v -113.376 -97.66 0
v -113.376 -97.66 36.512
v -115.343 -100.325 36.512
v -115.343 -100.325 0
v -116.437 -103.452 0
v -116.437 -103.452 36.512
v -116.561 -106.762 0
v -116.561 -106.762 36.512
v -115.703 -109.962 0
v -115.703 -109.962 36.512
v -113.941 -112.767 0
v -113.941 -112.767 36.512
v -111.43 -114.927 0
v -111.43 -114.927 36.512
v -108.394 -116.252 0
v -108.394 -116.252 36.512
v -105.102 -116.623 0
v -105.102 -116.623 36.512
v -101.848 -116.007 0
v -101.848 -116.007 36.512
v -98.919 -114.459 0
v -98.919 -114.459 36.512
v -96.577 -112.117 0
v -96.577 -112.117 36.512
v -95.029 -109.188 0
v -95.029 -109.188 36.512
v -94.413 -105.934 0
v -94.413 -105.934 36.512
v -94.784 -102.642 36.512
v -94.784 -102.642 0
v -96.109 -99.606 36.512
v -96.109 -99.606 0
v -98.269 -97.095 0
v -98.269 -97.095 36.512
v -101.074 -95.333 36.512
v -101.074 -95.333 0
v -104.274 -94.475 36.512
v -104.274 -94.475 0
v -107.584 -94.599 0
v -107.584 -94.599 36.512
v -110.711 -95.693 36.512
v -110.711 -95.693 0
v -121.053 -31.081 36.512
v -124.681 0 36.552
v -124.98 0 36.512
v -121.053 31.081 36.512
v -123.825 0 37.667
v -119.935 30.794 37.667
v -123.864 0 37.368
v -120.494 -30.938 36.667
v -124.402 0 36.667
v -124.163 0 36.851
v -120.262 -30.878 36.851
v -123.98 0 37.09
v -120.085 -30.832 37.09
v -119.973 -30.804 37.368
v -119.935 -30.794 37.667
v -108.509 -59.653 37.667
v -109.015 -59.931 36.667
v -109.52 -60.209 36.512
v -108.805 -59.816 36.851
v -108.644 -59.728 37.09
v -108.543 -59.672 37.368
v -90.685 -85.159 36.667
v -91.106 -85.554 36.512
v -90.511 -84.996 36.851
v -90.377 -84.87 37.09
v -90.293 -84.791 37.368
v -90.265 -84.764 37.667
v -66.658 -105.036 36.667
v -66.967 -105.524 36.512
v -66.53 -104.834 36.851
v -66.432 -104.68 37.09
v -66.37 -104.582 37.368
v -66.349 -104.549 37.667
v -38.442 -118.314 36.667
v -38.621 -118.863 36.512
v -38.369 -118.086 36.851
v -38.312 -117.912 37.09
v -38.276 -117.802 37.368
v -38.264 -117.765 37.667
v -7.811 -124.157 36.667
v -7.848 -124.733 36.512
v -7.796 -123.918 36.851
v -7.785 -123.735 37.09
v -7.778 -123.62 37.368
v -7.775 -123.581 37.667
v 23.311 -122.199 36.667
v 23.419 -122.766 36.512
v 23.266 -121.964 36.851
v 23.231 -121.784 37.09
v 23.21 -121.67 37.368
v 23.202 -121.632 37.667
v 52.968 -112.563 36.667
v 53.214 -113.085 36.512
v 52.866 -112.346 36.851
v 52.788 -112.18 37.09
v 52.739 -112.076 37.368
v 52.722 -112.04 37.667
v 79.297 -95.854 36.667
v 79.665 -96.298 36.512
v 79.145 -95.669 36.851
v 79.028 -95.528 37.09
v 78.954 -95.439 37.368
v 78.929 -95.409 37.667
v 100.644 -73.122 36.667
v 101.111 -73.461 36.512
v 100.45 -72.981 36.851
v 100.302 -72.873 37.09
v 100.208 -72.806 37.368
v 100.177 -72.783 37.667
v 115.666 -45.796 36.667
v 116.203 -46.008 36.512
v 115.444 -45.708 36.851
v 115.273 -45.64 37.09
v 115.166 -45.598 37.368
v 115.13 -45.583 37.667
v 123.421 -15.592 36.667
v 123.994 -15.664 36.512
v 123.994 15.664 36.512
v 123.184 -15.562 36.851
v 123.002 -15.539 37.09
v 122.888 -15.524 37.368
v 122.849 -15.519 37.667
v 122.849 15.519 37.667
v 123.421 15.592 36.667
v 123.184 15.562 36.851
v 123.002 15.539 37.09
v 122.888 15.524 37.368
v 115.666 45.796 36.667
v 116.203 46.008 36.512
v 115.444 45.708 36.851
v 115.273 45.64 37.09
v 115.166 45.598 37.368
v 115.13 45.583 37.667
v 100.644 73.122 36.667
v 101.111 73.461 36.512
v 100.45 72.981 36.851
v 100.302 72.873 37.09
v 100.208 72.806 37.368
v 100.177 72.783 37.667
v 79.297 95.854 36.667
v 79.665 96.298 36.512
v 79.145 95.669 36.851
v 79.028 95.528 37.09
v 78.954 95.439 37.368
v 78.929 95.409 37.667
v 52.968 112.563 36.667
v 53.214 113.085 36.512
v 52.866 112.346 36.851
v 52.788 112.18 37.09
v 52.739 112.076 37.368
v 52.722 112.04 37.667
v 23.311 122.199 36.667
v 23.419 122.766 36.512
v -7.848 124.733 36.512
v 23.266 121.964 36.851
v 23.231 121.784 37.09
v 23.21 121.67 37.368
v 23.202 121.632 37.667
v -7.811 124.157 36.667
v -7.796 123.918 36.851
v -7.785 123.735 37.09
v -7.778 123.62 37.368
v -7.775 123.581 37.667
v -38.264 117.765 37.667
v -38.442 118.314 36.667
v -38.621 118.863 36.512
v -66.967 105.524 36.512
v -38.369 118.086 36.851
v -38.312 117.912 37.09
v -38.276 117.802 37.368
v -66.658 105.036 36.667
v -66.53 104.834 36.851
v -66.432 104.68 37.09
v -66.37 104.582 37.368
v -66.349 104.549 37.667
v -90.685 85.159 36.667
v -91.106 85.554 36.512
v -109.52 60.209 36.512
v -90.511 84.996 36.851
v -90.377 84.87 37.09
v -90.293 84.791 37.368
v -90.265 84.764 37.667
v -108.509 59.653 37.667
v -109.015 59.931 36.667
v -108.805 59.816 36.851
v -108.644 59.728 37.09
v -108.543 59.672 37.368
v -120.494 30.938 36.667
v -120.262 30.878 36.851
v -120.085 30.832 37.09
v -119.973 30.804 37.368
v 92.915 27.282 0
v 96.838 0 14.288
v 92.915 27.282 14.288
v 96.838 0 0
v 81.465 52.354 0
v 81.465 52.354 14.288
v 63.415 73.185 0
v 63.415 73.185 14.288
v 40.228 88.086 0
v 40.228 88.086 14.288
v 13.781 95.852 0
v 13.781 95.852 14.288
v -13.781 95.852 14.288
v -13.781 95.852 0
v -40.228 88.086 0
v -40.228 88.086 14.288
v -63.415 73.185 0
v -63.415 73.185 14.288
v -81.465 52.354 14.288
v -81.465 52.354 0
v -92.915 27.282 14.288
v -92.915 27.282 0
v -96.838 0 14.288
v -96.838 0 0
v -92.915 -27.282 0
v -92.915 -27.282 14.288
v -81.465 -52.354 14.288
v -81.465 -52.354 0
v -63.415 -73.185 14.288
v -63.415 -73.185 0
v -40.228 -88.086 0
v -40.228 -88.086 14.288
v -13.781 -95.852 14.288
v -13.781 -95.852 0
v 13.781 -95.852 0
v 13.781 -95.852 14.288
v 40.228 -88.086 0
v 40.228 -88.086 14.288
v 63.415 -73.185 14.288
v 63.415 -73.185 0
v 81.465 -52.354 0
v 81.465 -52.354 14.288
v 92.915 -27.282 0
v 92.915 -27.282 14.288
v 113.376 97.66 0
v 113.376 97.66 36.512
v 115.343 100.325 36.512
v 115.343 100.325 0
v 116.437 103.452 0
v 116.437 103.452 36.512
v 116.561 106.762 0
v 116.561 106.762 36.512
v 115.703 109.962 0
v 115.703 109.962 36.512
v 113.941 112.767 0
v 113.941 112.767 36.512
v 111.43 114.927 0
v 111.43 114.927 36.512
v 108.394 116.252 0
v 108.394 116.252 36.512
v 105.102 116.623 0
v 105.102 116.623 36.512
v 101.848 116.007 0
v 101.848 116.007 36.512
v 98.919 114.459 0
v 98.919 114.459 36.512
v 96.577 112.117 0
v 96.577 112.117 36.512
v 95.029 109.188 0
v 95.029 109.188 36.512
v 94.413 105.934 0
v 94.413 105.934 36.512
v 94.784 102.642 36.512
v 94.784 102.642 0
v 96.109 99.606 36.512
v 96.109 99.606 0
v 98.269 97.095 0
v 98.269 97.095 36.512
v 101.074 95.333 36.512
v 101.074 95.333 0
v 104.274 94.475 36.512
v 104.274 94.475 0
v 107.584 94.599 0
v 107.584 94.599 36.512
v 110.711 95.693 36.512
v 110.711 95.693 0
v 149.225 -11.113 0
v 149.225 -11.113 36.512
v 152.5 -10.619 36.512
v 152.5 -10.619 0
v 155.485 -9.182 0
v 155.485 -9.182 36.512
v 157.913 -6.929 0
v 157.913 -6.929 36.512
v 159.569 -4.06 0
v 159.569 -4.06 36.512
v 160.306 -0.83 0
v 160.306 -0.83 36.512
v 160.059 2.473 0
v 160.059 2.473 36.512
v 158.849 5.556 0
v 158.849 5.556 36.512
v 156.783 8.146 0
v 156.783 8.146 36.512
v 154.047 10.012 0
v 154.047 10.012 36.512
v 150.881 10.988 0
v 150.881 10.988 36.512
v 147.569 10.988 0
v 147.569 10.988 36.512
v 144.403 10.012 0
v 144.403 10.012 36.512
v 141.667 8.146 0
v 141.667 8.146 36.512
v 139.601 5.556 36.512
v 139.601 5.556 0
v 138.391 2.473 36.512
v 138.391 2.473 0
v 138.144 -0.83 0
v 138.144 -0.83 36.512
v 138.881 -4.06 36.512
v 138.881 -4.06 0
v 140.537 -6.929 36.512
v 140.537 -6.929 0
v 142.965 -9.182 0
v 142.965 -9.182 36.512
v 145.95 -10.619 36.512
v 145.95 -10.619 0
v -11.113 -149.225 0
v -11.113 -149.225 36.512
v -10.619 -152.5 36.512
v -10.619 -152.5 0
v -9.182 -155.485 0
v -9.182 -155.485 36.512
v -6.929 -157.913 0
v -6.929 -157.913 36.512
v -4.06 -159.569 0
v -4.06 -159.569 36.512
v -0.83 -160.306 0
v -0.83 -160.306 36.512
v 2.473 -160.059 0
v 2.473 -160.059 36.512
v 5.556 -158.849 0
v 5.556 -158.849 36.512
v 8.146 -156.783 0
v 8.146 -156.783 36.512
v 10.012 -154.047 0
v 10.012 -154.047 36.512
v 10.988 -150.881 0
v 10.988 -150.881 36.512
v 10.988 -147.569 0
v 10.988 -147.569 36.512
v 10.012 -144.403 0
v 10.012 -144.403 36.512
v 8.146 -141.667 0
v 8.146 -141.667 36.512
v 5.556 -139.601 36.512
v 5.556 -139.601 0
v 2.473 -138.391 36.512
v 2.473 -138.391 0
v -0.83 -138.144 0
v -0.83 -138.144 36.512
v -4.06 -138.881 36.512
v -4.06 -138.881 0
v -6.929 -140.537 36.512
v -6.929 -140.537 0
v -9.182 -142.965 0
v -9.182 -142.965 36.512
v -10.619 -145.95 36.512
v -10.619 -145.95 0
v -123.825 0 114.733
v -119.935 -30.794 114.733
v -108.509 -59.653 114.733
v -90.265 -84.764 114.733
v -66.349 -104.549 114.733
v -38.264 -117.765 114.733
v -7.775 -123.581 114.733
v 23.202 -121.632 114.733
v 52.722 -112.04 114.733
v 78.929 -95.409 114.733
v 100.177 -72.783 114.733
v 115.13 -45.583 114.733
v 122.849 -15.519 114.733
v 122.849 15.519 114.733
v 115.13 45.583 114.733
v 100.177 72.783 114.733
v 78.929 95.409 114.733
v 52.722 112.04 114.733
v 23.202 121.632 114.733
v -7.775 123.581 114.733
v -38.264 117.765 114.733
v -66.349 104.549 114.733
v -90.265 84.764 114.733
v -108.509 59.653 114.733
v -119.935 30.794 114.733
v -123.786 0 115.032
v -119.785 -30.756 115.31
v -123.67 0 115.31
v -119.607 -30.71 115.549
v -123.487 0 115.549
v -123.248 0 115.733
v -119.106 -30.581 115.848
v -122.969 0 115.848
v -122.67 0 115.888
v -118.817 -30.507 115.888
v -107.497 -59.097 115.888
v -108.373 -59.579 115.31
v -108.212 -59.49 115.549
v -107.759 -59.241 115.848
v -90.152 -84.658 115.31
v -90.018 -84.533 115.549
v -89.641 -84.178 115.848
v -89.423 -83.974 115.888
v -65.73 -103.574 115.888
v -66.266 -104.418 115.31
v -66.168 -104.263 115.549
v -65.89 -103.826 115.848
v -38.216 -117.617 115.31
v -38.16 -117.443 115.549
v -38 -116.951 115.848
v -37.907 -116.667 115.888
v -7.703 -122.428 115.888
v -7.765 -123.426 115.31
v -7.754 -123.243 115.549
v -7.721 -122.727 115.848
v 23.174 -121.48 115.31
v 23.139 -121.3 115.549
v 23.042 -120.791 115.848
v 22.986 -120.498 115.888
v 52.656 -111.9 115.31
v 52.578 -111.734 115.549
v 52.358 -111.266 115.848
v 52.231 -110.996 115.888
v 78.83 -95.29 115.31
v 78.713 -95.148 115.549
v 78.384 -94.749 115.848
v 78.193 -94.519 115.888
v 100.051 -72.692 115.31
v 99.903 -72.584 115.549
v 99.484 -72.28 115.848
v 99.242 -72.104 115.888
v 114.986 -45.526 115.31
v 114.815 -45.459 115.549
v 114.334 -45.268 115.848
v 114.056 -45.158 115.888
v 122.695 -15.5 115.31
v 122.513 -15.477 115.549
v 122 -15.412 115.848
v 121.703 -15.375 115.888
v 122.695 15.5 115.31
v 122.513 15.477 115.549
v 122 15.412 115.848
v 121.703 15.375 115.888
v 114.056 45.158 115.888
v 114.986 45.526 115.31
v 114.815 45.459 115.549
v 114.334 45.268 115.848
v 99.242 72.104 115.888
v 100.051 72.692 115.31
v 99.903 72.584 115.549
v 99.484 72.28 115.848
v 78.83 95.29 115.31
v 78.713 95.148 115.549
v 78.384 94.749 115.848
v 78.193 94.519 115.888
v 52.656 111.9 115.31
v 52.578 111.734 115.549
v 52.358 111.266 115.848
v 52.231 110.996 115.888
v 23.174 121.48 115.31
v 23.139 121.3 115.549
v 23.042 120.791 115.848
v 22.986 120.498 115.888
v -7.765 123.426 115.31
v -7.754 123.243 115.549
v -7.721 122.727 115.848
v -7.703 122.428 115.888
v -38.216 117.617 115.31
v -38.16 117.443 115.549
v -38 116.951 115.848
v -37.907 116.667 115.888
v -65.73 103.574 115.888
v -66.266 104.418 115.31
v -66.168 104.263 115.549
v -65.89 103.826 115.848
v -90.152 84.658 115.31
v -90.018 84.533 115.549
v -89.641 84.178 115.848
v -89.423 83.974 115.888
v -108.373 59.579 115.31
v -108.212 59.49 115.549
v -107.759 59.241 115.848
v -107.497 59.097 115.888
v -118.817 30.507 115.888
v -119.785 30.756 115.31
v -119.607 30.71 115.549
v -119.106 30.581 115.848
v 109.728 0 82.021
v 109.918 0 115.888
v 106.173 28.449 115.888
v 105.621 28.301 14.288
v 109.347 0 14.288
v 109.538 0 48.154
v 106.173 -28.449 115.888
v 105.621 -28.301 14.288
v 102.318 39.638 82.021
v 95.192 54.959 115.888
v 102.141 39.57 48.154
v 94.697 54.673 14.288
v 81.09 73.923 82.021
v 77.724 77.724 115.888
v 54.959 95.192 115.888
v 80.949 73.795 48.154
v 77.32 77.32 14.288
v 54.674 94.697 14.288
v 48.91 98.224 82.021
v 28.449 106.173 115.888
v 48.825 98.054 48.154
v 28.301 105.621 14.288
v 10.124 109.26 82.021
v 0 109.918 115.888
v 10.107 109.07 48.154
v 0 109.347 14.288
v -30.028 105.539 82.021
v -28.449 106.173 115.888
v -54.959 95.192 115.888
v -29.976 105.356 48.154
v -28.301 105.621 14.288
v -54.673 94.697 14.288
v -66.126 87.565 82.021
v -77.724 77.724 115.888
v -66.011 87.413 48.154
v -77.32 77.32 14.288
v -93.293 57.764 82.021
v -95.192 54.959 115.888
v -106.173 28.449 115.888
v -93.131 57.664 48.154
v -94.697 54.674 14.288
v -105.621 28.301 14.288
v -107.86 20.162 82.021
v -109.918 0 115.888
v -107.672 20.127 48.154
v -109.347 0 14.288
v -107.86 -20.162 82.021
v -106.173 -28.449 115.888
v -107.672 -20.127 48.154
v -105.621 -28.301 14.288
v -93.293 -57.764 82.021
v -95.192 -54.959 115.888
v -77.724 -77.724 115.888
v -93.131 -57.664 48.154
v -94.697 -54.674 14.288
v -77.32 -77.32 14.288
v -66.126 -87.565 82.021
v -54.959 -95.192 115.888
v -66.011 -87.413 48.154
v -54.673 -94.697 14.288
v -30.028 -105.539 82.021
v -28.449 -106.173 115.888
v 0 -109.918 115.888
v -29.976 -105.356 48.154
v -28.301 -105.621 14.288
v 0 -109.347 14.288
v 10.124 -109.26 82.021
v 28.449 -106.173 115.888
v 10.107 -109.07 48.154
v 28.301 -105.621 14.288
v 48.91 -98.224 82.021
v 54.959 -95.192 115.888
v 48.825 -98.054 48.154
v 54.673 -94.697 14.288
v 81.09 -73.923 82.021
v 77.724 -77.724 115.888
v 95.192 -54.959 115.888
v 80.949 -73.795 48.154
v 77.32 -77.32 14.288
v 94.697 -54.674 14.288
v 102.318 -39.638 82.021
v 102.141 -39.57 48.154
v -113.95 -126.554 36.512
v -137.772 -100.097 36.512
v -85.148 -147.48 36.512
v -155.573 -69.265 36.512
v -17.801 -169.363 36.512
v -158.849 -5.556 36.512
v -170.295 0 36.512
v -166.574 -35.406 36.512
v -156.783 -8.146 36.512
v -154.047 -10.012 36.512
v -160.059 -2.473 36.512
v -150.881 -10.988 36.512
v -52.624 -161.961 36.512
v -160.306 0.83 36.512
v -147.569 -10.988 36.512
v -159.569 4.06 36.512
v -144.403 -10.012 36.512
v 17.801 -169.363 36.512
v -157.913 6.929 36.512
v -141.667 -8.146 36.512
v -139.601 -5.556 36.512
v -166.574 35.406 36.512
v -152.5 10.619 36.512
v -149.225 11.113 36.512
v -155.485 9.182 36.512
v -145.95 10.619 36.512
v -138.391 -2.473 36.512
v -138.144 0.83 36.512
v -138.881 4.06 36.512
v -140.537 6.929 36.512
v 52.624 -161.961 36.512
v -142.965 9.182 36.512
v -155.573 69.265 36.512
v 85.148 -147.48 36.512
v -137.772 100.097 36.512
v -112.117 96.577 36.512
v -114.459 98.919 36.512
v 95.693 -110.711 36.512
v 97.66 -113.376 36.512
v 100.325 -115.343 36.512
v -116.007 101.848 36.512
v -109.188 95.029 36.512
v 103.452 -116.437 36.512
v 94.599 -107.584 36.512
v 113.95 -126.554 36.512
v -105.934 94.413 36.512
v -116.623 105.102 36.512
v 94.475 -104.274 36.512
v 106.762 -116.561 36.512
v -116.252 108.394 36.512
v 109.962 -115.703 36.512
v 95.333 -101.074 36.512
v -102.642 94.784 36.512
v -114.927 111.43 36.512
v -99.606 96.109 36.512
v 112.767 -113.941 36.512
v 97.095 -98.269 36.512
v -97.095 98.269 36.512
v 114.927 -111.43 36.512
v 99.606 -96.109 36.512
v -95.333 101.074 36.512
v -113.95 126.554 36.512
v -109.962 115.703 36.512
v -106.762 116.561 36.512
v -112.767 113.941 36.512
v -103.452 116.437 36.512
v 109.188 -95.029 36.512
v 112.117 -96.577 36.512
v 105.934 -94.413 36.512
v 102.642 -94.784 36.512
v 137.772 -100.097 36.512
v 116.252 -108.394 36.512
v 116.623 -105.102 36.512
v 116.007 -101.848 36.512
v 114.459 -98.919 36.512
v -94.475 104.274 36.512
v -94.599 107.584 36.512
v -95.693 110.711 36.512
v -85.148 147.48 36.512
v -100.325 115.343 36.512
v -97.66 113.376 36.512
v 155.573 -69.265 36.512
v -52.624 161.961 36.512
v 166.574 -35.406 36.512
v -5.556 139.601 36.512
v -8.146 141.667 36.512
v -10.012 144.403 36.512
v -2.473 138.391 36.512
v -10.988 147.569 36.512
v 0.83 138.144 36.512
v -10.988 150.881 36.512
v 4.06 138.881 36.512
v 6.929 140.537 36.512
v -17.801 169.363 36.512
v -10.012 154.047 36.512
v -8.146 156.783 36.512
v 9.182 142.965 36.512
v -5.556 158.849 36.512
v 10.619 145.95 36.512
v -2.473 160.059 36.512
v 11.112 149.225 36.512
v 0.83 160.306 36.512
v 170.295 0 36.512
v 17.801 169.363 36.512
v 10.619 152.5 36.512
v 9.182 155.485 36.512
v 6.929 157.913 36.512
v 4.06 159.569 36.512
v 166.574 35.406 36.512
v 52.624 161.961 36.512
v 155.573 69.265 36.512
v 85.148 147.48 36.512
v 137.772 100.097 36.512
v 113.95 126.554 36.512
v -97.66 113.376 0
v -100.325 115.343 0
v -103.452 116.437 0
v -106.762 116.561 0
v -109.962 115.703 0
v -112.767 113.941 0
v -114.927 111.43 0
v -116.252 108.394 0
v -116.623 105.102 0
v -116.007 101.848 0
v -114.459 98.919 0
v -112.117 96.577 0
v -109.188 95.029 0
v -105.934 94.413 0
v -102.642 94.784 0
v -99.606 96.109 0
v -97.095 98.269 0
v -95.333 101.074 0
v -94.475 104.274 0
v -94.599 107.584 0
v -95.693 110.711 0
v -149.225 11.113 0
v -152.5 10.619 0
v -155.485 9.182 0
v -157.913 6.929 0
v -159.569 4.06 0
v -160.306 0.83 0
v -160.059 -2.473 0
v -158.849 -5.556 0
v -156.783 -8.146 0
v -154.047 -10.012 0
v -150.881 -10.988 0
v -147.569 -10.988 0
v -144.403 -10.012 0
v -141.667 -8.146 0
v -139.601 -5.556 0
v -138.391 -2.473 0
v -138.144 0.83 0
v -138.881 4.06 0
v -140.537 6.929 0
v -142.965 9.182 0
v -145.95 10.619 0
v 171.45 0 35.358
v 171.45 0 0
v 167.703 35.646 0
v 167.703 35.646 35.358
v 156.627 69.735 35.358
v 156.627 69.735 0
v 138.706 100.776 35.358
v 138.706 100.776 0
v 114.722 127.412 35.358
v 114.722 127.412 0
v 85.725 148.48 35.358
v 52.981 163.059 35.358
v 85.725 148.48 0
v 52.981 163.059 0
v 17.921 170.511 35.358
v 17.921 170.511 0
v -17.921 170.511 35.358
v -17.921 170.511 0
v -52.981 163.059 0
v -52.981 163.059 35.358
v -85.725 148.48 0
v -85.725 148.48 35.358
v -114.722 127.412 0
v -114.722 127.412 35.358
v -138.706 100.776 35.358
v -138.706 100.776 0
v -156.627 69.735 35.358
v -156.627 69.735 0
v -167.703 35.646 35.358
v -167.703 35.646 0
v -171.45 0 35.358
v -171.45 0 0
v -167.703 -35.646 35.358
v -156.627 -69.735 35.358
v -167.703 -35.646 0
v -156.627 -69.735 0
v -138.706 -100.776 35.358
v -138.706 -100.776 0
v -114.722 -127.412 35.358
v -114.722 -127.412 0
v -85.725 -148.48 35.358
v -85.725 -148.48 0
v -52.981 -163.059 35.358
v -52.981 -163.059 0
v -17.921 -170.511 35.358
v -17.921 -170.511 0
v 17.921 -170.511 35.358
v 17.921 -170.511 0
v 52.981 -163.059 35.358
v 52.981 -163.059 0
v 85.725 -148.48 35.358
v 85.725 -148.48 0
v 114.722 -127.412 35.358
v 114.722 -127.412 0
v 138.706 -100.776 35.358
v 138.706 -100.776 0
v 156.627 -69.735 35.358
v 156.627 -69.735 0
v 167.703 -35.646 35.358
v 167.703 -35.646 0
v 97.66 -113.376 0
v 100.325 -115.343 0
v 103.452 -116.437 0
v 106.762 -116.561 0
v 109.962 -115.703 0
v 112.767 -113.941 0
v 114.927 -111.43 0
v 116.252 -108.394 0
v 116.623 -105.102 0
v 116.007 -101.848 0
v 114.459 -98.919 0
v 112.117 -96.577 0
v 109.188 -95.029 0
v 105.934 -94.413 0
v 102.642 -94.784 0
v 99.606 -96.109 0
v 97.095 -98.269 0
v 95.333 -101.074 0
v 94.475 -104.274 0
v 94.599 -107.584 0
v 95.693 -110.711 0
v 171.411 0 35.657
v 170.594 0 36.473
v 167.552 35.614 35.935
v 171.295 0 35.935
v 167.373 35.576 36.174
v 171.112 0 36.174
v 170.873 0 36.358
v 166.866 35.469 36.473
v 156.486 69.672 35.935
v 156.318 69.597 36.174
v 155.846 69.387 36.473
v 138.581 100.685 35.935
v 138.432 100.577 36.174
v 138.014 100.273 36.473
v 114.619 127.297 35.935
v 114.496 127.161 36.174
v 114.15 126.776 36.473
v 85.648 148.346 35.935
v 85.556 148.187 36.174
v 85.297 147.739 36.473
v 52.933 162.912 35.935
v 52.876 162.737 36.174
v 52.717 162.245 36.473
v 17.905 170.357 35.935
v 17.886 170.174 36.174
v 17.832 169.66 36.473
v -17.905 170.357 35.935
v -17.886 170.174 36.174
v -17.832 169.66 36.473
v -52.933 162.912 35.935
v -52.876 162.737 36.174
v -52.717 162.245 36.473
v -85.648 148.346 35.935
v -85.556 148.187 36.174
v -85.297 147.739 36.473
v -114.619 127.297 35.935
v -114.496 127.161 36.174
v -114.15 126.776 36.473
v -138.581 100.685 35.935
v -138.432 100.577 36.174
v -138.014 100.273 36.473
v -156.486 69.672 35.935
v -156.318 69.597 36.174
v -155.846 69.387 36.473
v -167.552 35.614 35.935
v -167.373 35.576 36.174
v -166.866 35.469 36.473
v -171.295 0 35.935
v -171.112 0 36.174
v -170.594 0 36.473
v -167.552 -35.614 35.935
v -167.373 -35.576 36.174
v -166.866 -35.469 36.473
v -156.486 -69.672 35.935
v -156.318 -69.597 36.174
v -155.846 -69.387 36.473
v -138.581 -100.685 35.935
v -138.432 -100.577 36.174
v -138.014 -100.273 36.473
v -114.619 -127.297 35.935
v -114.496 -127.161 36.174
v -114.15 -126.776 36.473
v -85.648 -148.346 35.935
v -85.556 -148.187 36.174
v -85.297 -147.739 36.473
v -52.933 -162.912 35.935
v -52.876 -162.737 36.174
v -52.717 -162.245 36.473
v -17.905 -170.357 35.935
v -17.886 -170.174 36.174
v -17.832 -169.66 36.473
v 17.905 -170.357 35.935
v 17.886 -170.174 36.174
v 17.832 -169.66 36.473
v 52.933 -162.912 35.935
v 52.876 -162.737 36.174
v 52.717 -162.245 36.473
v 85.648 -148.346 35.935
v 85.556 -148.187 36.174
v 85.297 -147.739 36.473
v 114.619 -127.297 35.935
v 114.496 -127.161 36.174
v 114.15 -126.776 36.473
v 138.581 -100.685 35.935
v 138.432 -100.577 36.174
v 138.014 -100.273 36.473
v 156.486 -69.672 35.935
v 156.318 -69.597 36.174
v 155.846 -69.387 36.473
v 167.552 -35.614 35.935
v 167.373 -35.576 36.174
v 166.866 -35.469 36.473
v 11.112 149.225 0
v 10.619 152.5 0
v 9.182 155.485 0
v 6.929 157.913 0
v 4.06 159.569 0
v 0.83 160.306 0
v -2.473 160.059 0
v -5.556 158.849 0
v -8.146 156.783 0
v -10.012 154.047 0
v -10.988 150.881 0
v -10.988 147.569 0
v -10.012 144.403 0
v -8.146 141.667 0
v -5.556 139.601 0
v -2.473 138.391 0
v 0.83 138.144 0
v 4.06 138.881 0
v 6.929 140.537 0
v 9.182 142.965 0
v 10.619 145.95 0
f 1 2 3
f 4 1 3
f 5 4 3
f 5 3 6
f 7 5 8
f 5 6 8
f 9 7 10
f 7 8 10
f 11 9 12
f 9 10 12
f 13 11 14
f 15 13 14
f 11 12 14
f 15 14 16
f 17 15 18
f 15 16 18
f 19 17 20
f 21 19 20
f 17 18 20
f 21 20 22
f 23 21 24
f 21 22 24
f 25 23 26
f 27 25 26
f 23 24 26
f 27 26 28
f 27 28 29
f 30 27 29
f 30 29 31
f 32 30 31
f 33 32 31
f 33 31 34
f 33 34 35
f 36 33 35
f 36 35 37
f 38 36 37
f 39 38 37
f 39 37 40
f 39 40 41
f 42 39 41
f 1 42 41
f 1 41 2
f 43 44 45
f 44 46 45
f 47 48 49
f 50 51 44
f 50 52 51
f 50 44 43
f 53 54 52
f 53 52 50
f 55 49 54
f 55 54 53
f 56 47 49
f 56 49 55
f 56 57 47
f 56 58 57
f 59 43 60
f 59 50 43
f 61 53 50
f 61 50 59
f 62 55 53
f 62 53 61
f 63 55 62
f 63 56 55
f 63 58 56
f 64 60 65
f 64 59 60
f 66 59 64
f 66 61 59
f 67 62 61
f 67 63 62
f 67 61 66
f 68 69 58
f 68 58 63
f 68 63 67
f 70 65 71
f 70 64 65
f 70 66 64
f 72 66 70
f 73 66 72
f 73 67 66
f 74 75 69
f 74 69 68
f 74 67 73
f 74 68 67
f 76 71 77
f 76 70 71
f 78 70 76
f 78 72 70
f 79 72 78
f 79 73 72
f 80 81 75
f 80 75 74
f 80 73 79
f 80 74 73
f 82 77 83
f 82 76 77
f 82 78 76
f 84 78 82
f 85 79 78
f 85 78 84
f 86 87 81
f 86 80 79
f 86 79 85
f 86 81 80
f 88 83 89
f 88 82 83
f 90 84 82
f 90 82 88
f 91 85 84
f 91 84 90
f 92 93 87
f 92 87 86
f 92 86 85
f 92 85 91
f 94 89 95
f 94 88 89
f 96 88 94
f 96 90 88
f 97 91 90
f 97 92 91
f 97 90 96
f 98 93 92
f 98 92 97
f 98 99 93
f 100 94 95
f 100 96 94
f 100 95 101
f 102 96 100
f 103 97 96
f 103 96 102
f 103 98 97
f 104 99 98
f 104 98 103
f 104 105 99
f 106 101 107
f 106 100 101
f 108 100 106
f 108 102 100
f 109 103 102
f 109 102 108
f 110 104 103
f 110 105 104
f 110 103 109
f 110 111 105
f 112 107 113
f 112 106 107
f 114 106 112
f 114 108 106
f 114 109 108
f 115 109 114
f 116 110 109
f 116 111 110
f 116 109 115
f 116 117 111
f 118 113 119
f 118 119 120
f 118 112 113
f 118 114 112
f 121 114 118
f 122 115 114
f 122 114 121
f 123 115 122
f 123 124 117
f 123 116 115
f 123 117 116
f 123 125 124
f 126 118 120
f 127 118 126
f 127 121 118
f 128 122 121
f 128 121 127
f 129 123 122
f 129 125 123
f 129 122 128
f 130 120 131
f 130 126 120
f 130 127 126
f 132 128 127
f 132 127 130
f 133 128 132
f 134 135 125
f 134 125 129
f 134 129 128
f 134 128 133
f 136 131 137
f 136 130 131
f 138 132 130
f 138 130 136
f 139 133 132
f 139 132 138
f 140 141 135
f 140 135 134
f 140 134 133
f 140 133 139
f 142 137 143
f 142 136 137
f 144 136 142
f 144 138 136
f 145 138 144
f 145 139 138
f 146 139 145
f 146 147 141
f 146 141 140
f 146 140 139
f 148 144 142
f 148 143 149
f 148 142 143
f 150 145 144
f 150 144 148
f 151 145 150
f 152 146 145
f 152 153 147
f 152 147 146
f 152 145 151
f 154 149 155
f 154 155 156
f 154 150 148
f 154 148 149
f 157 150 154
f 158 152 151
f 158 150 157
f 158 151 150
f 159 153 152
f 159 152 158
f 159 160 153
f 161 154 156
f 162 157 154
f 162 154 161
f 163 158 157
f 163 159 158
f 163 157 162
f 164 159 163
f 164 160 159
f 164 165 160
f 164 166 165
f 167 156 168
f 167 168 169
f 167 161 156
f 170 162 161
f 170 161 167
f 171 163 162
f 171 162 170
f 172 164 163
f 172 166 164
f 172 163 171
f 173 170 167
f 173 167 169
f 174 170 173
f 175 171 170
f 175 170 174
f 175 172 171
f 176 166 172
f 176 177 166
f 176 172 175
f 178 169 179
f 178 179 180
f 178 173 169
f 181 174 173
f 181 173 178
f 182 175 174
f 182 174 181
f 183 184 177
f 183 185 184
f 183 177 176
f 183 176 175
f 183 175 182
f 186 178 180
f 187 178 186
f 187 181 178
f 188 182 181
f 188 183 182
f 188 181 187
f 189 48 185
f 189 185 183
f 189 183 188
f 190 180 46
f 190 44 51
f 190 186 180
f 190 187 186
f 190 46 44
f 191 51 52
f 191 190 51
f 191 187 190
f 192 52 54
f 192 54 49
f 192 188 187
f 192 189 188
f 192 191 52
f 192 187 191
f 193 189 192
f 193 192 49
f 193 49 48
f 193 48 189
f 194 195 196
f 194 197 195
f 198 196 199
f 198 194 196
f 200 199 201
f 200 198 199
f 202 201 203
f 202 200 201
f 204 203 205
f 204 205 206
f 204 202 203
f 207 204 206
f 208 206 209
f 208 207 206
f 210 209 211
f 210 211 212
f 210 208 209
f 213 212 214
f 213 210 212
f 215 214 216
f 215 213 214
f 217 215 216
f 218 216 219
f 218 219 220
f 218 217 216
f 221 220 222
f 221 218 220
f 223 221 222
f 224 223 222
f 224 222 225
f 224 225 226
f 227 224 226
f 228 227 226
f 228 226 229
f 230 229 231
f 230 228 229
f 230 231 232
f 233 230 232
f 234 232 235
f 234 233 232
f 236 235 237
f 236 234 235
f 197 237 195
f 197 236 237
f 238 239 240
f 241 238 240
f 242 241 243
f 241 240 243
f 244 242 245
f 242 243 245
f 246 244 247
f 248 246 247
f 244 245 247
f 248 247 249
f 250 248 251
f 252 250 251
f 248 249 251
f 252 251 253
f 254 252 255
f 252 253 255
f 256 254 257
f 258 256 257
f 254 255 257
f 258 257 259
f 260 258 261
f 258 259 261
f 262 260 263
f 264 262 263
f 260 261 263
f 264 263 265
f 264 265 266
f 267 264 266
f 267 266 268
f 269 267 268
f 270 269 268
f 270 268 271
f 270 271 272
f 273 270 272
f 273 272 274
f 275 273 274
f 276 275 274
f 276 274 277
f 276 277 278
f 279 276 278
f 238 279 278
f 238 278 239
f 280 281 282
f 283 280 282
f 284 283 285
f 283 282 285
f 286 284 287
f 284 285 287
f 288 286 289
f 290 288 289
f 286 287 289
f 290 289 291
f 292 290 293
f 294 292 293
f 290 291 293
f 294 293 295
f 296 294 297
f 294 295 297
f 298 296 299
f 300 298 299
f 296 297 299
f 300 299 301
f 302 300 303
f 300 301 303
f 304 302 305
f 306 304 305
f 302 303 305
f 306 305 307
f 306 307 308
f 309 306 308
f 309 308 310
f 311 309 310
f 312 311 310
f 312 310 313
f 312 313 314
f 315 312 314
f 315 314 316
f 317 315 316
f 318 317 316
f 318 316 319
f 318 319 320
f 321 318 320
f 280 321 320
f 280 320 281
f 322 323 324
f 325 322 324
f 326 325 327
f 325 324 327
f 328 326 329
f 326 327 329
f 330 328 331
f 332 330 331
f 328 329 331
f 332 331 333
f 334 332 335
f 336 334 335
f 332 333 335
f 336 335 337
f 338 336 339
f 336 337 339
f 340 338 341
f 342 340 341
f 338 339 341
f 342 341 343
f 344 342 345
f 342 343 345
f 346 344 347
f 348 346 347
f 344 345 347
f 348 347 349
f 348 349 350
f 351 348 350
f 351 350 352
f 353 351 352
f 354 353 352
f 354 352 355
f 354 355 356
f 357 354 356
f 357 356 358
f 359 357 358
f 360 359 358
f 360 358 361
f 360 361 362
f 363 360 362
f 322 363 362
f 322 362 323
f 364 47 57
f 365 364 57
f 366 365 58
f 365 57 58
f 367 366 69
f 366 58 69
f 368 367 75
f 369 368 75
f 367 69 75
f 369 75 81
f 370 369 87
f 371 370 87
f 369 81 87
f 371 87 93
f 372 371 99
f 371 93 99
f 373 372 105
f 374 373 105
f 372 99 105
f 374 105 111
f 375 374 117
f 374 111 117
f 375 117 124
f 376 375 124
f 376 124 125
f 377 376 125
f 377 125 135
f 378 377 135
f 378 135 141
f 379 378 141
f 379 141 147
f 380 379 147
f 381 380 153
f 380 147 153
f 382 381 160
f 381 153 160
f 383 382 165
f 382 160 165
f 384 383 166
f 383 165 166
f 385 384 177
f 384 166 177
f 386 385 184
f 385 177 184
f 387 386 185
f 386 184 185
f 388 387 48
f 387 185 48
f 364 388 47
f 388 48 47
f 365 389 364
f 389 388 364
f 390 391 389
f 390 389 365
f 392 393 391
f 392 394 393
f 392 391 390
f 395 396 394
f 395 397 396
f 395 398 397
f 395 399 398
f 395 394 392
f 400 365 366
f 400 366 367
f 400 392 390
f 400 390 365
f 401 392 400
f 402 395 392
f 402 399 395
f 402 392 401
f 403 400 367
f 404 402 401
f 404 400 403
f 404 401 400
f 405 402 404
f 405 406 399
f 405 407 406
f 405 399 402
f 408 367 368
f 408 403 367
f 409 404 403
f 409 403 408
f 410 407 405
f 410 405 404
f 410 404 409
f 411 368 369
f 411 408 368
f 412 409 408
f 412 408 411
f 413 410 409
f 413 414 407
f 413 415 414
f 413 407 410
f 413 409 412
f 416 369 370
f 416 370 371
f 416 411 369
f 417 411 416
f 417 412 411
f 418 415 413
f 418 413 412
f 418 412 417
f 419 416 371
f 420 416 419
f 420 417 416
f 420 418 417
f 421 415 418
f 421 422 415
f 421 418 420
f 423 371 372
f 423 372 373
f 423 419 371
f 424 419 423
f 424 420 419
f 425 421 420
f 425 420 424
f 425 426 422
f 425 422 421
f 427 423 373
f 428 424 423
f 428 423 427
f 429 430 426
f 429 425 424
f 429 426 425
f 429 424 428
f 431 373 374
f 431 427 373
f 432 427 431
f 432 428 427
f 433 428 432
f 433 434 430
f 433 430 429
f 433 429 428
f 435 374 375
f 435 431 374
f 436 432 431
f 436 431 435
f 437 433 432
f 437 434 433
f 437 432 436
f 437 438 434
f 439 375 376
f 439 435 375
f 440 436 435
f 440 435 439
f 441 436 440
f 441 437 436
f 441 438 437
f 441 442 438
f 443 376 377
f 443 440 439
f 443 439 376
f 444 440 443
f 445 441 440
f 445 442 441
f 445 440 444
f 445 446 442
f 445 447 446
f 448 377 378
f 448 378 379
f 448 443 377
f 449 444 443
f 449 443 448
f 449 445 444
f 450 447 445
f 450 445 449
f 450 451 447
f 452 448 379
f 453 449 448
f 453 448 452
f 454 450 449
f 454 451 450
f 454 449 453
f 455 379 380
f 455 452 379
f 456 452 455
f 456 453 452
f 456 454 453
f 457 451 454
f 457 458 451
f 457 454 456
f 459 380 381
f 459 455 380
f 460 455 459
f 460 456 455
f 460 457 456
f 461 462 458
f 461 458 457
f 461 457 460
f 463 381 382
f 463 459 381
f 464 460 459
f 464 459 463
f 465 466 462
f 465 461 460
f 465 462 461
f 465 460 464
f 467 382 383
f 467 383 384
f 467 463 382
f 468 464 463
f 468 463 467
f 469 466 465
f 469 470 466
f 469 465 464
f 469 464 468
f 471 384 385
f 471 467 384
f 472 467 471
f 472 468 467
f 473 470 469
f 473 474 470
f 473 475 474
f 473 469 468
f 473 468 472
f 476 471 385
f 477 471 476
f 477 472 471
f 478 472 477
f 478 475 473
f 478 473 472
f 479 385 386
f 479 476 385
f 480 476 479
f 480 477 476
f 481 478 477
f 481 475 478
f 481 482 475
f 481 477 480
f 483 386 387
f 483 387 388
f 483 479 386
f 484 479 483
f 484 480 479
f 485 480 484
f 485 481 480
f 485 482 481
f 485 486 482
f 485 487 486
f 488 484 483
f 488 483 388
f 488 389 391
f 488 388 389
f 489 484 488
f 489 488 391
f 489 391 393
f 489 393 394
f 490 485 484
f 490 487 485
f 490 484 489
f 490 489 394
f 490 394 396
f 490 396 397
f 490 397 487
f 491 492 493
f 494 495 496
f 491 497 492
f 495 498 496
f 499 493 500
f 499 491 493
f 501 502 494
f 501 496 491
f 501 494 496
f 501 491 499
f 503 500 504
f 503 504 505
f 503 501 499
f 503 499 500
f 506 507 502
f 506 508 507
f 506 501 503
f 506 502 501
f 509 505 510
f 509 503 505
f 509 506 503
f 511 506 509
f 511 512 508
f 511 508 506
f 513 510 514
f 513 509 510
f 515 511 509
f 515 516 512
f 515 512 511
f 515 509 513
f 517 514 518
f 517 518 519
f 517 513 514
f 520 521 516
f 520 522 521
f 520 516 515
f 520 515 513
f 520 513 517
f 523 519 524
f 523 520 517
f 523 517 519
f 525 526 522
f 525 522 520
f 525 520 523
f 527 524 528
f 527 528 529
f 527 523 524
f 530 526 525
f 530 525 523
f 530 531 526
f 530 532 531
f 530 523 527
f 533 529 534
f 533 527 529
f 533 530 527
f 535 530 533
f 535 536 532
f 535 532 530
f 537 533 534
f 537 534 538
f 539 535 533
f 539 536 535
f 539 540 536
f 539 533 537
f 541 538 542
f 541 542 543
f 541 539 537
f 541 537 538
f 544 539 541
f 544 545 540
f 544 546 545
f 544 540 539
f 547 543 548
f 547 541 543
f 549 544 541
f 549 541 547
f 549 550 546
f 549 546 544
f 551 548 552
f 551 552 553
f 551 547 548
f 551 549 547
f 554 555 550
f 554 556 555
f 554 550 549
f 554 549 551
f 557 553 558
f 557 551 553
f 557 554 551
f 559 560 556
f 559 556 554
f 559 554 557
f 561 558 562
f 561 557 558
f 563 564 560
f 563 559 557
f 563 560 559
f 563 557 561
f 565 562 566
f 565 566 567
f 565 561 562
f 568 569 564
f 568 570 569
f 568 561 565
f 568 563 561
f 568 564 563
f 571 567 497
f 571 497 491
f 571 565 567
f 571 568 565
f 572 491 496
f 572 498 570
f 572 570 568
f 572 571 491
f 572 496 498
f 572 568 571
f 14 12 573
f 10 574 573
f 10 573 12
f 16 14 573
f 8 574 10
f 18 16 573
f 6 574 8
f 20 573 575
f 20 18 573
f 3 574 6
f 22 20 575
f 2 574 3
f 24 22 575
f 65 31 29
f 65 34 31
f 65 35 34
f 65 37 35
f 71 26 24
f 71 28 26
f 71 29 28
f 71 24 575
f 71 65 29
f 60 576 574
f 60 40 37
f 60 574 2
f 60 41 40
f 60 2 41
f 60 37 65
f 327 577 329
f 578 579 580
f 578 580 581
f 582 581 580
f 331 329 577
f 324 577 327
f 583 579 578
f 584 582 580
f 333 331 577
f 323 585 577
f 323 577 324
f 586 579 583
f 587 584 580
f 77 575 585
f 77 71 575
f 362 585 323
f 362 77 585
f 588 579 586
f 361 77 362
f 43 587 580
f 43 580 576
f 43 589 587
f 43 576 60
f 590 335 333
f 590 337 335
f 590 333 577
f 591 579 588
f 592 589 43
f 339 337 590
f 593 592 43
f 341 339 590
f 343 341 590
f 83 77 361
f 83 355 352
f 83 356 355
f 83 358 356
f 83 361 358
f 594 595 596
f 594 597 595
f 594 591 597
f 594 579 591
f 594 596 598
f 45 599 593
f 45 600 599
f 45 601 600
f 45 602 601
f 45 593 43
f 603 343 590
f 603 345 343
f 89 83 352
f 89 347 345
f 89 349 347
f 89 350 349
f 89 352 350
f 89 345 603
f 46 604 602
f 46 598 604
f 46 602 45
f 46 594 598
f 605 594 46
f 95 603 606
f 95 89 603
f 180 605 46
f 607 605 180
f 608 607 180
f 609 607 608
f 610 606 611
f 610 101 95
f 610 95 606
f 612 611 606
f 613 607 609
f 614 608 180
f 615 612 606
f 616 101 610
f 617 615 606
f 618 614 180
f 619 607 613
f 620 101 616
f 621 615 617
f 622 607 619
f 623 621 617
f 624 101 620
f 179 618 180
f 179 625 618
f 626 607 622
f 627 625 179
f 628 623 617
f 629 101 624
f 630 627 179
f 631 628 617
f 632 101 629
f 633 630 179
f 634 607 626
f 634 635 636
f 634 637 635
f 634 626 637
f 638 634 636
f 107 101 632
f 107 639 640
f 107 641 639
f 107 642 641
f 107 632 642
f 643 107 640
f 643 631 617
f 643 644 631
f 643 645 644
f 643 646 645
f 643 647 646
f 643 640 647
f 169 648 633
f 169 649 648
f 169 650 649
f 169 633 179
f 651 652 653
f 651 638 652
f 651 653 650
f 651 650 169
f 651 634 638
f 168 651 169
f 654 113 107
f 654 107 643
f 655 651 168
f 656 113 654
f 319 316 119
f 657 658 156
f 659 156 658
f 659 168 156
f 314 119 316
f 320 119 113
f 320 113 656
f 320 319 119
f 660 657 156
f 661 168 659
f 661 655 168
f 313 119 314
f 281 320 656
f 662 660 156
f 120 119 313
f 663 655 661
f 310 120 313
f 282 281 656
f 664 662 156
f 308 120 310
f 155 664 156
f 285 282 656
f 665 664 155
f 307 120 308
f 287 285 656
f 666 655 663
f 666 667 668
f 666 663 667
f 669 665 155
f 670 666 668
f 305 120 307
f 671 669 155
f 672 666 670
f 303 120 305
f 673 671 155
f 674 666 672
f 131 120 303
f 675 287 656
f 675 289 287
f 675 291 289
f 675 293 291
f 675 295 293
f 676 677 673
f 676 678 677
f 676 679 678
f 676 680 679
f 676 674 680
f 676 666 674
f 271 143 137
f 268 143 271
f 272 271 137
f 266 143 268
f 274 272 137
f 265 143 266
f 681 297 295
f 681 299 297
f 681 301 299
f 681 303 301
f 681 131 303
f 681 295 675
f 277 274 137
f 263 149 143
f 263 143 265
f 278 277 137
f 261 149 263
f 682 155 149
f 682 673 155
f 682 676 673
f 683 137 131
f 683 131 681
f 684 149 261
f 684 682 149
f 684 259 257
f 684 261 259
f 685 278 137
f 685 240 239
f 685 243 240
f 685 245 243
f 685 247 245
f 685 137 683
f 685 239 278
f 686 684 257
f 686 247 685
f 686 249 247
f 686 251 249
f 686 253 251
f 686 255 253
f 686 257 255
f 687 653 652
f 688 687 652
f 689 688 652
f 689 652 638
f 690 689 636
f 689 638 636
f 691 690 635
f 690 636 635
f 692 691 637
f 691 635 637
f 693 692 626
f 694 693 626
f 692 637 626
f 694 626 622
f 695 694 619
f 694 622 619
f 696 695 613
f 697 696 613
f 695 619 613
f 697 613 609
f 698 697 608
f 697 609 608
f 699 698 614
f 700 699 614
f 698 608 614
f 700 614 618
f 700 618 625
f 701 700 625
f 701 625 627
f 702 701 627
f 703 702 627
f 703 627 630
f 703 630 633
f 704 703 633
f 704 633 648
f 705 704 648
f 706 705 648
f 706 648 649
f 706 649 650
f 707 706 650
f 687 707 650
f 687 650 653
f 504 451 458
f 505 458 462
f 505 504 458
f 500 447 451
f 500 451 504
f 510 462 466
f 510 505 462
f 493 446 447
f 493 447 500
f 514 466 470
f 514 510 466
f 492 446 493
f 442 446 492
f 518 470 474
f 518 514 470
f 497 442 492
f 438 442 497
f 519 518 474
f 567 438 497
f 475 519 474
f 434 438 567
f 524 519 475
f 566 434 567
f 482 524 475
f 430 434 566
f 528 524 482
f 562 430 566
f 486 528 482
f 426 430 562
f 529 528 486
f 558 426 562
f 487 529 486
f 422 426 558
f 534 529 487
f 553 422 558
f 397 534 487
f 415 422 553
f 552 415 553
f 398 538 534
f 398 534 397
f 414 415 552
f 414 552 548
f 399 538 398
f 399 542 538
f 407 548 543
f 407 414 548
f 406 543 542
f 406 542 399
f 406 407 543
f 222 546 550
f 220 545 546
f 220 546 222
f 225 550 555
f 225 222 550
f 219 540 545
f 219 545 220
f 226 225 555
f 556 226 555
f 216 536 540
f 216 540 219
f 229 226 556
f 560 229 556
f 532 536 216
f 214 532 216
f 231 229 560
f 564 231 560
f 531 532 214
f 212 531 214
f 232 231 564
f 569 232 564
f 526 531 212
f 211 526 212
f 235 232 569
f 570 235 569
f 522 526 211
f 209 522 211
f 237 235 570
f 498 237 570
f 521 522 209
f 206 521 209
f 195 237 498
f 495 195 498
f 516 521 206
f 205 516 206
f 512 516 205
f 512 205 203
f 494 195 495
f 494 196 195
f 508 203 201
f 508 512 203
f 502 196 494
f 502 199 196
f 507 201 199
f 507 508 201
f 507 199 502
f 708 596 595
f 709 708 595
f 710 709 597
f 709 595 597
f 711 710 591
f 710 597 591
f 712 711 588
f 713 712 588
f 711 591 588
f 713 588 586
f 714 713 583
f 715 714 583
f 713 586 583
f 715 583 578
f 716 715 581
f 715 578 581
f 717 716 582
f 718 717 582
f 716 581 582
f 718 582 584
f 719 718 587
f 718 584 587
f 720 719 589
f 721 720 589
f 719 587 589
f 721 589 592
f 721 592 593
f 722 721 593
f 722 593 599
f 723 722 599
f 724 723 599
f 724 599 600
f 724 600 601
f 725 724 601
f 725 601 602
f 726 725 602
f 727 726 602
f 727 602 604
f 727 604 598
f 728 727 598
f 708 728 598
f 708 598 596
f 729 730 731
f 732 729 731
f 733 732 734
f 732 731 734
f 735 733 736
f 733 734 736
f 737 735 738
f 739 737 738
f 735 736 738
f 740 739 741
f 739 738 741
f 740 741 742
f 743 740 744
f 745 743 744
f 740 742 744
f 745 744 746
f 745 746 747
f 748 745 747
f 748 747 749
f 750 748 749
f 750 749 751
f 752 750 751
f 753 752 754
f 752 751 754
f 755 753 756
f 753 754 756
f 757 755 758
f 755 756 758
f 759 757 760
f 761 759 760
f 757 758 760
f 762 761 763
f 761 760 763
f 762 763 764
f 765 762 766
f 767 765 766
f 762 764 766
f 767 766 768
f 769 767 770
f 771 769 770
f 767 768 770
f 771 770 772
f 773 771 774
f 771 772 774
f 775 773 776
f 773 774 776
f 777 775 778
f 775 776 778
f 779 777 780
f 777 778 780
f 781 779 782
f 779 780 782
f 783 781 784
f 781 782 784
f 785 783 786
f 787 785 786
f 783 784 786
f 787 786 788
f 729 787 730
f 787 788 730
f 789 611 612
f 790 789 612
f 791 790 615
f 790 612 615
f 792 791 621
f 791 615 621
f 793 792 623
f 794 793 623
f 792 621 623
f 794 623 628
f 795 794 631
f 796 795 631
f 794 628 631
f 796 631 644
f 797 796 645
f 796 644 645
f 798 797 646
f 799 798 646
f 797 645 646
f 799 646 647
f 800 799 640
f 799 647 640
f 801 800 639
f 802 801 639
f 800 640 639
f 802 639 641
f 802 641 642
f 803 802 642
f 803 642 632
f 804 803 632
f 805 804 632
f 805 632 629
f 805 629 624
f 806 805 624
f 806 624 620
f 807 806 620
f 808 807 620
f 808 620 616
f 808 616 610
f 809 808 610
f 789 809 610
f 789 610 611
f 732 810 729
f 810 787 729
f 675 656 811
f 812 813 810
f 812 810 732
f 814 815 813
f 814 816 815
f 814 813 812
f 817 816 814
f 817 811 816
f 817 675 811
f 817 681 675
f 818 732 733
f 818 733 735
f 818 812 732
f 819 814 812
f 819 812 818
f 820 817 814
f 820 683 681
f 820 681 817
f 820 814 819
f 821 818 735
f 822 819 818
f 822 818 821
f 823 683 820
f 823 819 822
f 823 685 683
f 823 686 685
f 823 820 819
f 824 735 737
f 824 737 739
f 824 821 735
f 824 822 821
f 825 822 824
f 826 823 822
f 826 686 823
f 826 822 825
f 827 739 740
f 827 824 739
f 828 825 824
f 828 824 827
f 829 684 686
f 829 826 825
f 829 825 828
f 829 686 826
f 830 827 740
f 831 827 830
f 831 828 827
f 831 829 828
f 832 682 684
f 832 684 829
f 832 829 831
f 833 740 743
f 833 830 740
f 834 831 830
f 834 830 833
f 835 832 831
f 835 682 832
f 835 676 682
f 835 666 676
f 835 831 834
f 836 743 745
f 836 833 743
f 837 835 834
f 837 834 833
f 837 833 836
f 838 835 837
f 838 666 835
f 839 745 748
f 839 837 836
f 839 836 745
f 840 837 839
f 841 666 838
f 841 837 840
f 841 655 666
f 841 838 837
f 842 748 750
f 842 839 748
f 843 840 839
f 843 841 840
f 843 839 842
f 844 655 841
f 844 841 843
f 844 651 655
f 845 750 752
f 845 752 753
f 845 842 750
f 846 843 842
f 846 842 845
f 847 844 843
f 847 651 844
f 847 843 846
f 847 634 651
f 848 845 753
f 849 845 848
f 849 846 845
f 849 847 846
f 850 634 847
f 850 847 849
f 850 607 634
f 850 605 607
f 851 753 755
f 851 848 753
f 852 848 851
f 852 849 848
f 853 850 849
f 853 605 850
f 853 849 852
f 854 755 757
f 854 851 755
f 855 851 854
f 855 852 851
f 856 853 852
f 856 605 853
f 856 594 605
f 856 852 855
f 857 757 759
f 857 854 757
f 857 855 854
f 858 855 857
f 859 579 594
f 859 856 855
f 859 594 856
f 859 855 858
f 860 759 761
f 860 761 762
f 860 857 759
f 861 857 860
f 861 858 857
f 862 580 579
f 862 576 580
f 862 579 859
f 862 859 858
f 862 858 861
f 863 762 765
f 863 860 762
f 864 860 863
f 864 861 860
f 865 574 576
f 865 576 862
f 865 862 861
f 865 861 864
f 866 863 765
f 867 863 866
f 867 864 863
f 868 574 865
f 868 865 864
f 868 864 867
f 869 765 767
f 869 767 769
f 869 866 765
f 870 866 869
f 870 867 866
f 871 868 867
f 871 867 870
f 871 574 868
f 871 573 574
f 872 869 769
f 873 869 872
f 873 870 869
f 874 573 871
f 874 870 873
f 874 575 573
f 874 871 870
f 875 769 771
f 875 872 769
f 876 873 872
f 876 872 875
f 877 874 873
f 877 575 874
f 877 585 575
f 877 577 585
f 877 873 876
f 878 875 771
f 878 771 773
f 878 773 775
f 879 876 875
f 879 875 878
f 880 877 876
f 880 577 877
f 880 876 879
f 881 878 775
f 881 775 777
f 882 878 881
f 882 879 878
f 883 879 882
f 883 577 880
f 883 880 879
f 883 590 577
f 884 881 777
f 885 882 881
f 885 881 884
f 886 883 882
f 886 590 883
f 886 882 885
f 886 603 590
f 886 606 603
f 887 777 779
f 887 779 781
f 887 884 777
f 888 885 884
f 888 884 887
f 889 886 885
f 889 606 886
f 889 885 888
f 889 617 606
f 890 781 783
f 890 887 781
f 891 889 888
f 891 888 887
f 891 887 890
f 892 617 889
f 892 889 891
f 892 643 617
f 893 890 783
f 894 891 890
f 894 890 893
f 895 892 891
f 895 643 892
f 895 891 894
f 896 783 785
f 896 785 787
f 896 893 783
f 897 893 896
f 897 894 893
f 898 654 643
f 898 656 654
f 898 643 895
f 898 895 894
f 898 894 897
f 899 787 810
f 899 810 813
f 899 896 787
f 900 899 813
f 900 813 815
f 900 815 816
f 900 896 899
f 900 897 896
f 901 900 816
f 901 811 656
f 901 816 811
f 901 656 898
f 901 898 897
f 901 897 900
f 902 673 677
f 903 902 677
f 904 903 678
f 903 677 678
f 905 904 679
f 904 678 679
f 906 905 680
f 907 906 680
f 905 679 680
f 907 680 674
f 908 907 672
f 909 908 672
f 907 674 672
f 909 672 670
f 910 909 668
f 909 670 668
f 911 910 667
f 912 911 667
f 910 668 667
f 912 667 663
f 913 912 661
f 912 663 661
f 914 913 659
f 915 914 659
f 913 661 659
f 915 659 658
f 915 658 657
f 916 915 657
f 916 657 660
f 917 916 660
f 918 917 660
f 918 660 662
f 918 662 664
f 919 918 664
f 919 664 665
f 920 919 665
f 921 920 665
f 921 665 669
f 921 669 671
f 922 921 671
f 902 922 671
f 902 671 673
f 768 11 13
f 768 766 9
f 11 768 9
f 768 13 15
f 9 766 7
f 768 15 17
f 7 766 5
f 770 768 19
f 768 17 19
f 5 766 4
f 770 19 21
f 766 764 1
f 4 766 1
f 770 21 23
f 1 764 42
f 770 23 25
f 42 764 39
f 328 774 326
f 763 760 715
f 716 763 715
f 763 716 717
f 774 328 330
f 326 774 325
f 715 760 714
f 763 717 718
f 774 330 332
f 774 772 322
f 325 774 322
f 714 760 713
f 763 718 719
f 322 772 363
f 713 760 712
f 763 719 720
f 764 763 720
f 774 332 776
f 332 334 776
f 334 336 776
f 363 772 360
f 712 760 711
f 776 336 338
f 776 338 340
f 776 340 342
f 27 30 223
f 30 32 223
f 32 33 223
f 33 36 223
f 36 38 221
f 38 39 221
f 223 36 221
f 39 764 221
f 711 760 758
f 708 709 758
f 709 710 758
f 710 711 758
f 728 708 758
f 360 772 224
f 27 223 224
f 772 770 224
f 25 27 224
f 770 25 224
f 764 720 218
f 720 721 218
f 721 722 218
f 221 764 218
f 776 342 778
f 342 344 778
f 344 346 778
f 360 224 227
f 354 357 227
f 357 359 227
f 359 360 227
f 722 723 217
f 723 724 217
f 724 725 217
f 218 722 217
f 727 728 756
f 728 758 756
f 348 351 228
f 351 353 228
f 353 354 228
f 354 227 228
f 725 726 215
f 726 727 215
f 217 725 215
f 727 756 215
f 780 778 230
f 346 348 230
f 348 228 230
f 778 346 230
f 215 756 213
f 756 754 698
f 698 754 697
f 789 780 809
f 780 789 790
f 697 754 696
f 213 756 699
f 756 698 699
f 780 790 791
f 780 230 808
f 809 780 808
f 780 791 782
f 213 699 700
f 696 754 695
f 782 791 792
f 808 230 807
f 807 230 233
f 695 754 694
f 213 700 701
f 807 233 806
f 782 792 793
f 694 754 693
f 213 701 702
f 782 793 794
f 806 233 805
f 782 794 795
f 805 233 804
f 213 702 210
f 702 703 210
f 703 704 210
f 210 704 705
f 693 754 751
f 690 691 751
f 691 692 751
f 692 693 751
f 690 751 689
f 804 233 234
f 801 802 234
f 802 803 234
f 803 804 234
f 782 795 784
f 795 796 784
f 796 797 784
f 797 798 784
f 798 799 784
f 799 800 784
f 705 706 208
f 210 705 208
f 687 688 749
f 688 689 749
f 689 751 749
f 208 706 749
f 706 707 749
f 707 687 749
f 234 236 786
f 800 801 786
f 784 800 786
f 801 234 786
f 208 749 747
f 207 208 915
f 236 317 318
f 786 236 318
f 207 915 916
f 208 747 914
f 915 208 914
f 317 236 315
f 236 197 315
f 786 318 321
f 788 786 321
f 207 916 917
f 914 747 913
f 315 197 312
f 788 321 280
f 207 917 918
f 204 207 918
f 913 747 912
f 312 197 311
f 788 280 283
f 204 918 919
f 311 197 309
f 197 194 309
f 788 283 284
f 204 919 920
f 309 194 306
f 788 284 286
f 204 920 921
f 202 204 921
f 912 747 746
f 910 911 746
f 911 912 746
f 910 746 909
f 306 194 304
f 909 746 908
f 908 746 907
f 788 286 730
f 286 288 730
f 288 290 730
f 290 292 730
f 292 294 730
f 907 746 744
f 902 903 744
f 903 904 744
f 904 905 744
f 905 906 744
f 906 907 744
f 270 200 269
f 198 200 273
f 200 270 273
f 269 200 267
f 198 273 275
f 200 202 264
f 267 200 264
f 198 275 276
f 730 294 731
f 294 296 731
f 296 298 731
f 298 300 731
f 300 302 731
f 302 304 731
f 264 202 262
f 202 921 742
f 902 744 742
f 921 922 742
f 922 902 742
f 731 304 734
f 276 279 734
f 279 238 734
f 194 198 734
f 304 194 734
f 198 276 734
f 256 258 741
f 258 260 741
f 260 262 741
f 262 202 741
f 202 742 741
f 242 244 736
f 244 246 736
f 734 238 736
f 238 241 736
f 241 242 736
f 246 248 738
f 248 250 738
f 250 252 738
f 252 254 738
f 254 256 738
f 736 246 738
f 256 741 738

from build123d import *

# Parameters (mm, degrees)
SKETCH1_R         = 171.45
EXTRUDE1_DEPTH    = 36.5125
SKETCH2_R         = 123.825
EXTRUDE2_DEPTH    = 79.375
SKETCH3_R         = 11.1125
EXTRUDE3_DEPTH    = 256.128586452
CIRPATTERN1_COUNT = 8
FILLET1_R         = 1.154545455


with BuildPart() as part:
    # Sketch1 → Extrude1 (new body)
    with BuildSketch(Plane.XY):
        Circle(SKETCH1_R)
    extrude(amount=EXTRUDE1_DEPTH)

    # Sketch2 → Extrude2 (add)
    with BuildSketch(Plane.XY.offset(36.5125)):
        with Locations(Location((0, 0, 0), (0, 0, 180))):
            Circle(SKETCH2_R)
    extrude(amount=EXTRUDE2_DEPTH)

    # Sketch3 → Extrude3 (cut, through all)
    with BuildSketch(Plane.XY.offset(36.5125)):
        with Locations((0, 149.225)):
            Circle(SKETCH3_R)
    extrude3 = extrude(amount=-EXTRUDE3_DEPTH, mode=Mode.SUBTRACT)

    # CirPattern1: Extrude3 ×8 about axis
    cirpattern1_axis = Axis((0, 0, 0), (0, 0, 1))
    for i in range(1, CIRPATTERN1_COUNT):
        add(extrude3.rotate(cirpattern1_axis, i * 360 / CIRPATTERN1_COUNT), mode=Mode.SUBTRACT)

    # Fillet1
    fillet1_edges = [part.edges().sort_by_distance(p)[0] for p in [
        (-171.45, 0, 36.5125),
        (123.825, 0, 36.5125),
        (123.825, 0, 115.8875),
    ]]
    fillet(fillet1_edges, radius=FILLET1_R)

    # Sketch4 → Cut-Revolve1 (revolve, cut)
    with BuildSketch(Plane(origin=(0, 0, 63.5), x_dir=(0, 0, -1), z_dir=(1, 0, 0)), mode=Mode.PRIVATE) as cut_revolve1_sk:
        Polygon((-52.3875, 109.9185), (49.2125, 109.347), (49.2125, 96.8375), (63.5, 96.8375), (63.5, 0), (-52.3875, 0), align=None)
    revolve(cut_revolve1_sk.sketch.rotate(Axis((0, 0, 0), (0, 0, 1)), 270), axis=Axis((0, 0, 0), (0, 0, 1)), mode=Mode.SUBTRACT)


solid = part.part
